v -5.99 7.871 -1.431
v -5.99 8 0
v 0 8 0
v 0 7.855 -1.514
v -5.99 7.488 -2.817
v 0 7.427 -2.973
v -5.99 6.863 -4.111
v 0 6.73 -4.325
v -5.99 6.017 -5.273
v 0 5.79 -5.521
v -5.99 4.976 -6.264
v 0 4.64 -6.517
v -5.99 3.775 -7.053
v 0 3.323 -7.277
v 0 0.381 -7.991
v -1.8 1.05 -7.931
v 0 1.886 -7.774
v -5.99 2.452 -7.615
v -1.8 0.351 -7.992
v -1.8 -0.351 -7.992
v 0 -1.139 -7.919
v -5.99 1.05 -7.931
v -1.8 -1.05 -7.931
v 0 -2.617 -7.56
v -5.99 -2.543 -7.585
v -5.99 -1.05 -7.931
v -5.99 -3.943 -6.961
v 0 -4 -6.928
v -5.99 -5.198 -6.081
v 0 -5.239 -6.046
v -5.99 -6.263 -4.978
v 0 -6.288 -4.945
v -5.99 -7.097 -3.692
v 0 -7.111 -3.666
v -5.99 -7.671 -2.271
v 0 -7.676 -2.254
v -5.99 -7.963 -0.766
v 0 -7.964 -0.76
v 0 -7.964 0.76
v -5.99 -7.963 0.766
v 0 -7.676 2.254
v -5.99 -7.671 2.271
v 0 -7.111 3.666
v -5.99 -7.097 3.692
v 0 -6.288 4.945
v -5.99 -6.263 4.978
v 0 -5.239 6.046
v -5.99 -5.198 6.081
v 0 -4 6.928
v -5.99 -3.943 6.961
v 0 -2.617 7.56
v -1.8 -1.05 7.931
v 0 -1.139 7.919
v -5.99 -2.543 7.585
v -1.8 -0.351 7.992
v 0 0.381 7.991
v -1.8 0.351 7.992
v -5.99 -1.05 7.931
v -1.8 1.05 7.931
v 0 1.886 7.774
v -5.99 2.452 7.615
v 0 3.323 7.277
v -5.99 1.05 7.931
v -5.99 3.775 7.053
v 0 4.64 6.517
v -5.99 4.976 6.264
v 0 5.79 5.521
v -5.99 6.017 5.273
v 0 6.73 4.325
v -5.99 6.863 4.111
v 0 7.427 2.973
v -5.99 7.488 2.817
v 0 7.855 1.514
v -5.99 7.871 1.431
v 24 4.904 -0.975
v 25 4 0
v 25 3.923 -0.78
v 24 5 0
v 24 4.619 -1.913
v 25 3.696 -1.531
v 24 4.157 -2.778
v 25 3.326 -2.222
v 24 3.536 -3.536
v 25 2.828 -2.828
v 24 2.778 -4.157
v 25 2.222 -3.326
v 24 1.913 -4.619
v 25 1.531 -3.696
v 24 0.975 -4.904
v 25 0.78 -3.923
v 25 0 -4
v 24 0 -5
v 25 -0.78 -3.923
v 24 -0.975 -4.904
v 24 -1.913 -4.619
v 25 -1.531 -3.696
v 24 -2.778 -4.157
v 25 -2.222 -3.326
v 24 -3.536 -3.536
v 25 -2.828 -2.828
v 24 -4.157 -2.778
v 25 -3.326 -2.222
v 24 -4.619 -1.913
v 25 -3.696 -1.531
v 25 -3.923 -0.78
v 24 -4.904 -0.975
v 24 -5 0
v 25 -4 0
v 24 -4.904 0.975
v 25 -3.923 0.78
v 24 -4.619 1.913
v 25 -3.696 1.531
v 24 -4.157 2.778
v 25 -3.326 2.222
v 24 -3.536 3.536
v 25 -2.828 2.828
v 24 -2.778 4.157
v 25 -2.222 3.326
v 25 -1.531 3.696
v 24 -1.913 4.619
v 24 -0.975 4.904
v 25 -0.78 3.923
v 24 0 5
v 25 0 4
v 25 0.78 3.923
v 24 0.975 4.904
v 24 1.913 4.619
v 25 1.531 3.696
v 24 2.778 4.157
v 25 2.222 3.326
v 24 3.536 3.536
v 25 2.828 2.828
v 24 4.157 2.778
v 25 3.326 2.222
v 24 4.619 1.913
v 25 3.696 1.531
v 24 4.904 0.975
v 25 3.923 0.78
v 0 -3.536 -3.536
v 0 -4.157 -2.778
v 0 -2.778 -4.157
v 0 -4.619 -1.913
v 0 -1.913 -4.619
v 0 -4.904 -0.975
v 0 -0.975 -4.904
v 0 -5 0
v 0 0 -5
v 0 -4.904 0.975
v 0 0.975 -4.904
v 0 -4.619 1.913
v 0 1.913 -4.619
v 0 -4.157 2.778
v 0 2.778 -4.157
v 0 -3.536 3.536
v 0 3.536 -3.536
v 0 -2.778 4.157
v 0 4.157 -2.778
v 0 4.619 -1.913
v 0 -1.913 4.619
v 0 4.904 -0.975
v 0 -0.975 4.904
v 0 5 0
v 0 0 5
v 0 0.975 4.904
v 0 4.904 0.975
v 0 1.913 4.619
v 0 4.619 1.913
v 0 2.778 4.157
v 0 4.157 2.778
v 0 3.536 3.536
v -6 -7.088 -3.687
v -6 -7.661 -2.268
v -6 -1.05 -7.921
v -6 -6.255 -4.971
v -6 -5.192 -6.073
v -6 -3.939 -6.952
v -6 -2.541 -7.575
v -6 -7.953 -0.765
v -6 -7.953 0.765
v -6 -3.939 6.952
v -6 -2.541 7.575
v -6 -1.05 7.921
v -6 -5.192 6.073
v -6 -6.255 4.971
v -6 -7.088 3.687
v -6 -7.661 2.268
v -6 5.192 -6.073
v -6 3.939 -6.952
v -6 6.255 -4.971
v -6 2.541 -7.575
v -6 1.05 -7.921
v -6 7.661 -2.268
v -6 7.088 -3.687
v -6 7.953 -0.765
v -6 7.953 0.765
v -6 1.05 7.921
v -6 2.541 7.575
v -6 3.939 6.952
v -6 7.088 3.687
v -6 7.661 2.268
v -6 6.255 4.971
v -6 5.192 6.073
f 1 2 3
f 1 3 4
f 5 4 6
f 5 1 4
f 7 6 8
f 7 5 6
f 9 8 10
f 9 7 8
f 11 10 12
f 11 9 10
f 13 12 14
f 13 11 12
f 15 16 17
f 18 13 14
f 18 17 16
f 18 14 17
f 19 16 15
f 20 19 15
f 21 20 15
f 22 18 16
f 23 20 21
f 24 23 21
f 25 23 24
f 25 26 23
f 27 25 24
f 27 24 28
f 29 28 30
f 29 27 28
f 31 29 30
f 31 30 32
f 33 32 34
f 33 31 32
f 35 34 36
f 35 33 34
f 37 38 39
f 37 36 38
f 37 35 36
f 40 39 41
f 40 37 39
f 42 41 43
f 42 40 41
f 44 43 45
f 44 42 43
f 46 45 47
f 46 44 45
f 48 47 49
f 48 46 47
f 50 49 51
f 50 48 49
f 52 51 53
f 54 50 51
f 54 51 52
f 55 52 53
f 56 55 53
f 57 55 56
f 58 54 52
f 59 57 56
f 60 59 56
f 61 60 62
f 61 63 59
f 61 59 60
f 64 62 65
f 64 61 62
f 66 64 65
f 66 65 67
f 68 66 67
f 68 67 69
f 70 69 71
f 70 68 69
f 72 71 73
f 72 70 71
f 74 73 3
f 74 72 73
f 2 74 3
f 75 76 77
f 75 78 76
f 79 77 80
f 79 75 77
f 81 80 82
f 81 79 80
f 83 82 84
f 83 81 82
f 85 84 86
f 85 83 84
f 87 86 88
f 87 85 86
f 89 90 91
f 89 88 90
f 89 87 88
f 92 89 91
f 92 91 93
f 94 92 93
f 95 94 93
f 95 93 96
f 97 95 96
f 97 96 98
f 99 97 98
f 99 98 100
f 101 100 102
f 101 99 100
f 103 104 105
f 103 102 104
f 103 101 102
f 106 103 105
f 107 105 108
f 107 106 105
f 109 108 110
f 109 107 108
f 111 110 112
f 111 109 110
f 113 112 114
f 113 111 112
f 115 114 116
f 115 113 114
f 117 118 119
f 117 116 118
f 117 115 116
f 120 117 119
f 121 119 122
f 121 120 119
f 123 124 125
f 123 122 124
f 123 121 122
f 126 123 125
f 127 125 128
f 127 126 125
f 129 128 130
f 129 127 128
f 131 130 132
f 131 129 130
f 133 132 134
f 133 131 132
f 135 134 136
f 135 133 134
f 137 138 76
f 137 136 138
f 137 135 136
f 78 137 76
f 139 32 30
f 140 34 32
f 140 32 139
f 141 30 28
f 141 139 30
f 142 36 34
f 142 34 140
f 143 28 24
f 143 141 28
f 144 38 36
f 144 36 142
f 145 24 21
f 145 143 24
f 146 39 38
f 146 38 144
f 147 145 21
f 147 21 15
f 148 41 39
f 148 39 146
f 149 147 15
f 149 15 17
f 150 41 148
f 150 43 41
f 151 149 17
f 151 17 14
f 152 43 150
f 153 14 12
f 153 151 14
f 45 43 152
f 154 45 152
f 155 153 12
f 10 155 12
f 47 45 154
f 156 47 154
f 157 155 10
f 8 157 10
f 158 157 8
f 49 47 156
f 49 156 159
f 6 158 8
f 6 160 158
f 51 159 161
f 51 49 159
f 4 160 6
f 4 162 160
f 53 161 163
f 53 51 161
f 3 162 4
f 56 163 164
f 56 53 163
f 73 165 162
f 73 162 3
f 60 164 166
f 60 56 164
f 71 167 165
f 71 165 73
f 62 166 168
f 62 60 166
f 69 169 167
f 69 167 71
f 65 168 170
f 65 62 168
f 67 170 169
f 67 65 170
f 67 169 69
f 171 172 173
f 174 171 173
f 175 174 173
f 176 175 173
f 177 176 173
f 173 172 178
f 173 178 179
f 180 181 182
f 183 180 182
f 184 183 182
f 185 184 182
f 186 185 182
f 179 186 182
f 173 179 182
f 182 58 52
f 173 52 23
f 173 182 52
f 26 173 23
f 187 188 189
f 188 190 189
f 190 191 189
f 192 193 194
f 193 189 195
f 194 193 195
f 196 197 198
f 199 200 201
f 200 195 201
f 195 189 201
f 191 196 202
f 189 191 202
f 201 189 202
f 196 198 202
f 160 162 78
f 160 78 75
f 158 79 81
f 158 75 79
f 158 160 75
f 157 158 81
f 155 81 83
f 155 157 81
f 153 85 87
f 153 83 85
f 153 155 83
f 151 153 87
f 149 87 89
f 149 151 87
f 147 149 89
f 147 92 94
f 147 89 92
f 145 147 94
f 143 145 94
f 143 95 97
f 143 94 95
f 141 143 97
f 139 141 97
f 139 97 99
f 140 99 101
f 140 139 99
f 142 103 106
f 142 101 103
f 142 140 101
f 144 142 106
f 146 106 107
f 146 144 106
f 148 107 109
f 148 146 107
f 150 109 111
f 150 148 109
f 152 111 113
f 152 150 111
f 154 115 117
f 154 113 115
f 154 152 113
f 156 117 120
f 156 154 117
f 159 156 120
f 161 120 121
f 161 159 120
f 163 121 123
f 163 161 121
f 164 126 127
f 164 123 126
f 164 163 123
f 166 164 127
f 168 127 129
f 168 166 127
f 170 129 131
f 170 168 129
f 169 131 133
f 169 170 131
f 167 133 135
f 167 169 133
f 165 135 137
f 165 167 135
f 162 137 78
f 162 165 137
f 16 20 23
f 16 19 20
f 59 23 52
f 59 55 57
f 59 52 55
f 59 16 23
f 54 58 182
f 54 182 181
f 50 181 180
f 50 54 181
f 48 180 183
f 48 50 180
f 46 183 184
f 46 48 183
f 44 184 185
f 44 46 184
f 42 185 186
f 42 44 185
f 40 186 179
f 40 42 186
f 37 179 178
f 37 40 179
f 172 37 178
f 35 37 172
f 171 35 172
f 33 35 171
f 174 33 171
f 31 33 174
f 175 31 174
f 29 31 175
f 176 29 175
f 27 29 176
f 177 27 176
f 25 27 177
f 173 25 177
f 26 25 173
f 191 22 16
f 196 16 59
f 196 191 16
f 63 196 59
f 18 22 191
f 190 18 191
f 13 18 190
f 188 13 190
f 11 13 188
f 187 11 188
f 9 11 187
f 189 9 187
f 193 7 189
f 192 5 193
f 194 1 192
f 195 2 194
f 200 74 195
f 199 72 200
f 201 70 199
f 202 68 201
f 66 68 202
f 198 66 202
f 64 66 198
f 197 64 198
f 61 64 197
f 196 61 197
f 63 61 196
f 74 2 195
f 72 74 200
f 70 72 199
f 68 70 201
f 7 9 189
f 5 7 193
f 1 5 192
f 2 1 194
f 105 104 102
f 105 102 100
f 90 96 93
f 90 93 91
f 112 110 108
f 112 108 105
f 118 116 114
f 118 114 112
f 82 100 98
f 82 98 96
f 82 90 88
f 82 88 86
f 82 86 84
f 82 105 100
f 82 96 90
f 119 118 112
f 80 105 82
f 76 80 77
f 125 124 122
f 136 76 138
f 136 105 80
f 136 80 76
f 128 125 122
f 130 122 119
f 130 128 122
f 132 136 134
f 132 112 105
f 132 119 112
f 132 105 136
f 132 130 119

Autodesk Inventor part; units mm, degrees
ref_plane "YZ Plane" through (0, 0, 0) normal (1, 0, 0) x (0, 1, 0)
ref_plane "XZ Plane" through (0, 0, 0) normal (0, 1, 0) x (-1, 0, 0)
sketch "Эскиз1" plane through (0, 0, 0) normal (0, 0, 1) x (1, 0, 0)
  line L0 (-6, 0) -> (25, 0)
  line L1 (25, 0) -> (25, 5)
  line L2 (25, 5) -> (1.5, 5)
  line L3 (1.5, 5) -> (0.5798, 5)
  line L4 (0.5798, 5) -> (0, 5)
  line L5 (0, 5) -> (0, 8)
  line L6 (-12.2, 0) -> (31.2, 0) projected
  line L7 (0, -1.6) -> (0, 9.6) projected
  line L8 (-6, 0) -> (-6, 8)
  line L9 (0, 8) -> (-6, 8)
  dimension "d0" = 25
  dimension "d1" = 23.5
  dimension "d2" = 0.9202
  dimension "d3" = 6
  dimension "d4" = 10
  dimension "d5" = 10
  dimension "d9" = 16
  dimension "d10" = 0
revolve "Базовый элемент" add sketch "Эскиз1" angle 360 about axis through (-6, 0, 0) along (1, 0, 0)
sketch "Эскиз2" plane through (-6, 0, 0) normal (-1, 0, 0) x (0, 0, 1)
  circle A0 centre (0, 0) radius 8 projected
  line L0 (0, 0) -> (0, 8) projected
  line L1 (-8, 1.05) -> (8, 1.05)
  line L2 (8, 1.05) -> (8, -1.05)
  line L3 (8, -1.05) -> (-8, -1.05)
  line L4 (-8, -1.05) -> (-8, 1.05)
  line L5 (-8, 0) -> (8, 0) construction
  line L6 (0, 1.05) -> (0, -1.05) construction
  dimension "d11" = 2.1
  dimension "d12" = 16
fillet "Сопряжение1" radius 0.01 1 edges at (-6, -8, 0)
extrude "Паз" cut sketch "Эскиз2" against normal blind 4.2 contours A0 L3 L1 | L2 L3 A0 | A0 L1 L2 | L3 L4 A0 | A0 L4 L1
thread "Резьба" size "M10x1.5" class "6g" standard "ISO Metric profile" length 23.5
chamfer "Chamfer4" distance 1 angle 45 1 edges at (25, -5, 0)
ref_plane "Work Plane1" through (30.1625, 0, 0) normal (0, 0, -1) x (1, 0, 0)
equation "\"d11\" = SBR"
equation "\"d12\" = KOD"
equation "\"d13\" = RR"
equation "\"d16\" = STI"
equation "\"d14\" = GEL"
equation "\"d40\" = 0.1 * GD"
equation "\"d0\" = NLG"
equation "\"d1\" = GEL"
equation "\"d2\" = GAL"
equation "\"d3\" = KOH"
equation "\"d4\" = GD"
equation "\"d5\" = BDM"
equation "\"d9\" = KOD"
equation "\"GD\" = NND"
equation "\"NLG\" = 25"
equation "\"GEL\" = 23.5"
equation "\"KOD\" = 16"
equation "\"KOH\" = 6"
equation "\"GAL\" = 0.61345 * PTC"
equation "\"BDM\" = NND"
equation "\"RR\" = 0.01"
equation "\"SBR\" = 2.1"
equation "\"STI\" = 4.2"
equation "\"KEWI\" = 0"
equation "\"GUL\" = 0.61345 * PTC"
equation "\"SPD\" = NND - 1.2269 * PTC"
equation "\"PTC\" = 1.5"
equation "\"TOA\" = 30deg"
equation "\"FAWI\" = 45deg"
equation "\"GD1\" = THREADDIA - 1.2269 * PTC"
equation "\"NND\" = 10"
equation "\"THREADDIA\" = 10"
properties part number "Винт M10-6gx25 ГОСТ 1491-80" material "Сталь, мягкая"
